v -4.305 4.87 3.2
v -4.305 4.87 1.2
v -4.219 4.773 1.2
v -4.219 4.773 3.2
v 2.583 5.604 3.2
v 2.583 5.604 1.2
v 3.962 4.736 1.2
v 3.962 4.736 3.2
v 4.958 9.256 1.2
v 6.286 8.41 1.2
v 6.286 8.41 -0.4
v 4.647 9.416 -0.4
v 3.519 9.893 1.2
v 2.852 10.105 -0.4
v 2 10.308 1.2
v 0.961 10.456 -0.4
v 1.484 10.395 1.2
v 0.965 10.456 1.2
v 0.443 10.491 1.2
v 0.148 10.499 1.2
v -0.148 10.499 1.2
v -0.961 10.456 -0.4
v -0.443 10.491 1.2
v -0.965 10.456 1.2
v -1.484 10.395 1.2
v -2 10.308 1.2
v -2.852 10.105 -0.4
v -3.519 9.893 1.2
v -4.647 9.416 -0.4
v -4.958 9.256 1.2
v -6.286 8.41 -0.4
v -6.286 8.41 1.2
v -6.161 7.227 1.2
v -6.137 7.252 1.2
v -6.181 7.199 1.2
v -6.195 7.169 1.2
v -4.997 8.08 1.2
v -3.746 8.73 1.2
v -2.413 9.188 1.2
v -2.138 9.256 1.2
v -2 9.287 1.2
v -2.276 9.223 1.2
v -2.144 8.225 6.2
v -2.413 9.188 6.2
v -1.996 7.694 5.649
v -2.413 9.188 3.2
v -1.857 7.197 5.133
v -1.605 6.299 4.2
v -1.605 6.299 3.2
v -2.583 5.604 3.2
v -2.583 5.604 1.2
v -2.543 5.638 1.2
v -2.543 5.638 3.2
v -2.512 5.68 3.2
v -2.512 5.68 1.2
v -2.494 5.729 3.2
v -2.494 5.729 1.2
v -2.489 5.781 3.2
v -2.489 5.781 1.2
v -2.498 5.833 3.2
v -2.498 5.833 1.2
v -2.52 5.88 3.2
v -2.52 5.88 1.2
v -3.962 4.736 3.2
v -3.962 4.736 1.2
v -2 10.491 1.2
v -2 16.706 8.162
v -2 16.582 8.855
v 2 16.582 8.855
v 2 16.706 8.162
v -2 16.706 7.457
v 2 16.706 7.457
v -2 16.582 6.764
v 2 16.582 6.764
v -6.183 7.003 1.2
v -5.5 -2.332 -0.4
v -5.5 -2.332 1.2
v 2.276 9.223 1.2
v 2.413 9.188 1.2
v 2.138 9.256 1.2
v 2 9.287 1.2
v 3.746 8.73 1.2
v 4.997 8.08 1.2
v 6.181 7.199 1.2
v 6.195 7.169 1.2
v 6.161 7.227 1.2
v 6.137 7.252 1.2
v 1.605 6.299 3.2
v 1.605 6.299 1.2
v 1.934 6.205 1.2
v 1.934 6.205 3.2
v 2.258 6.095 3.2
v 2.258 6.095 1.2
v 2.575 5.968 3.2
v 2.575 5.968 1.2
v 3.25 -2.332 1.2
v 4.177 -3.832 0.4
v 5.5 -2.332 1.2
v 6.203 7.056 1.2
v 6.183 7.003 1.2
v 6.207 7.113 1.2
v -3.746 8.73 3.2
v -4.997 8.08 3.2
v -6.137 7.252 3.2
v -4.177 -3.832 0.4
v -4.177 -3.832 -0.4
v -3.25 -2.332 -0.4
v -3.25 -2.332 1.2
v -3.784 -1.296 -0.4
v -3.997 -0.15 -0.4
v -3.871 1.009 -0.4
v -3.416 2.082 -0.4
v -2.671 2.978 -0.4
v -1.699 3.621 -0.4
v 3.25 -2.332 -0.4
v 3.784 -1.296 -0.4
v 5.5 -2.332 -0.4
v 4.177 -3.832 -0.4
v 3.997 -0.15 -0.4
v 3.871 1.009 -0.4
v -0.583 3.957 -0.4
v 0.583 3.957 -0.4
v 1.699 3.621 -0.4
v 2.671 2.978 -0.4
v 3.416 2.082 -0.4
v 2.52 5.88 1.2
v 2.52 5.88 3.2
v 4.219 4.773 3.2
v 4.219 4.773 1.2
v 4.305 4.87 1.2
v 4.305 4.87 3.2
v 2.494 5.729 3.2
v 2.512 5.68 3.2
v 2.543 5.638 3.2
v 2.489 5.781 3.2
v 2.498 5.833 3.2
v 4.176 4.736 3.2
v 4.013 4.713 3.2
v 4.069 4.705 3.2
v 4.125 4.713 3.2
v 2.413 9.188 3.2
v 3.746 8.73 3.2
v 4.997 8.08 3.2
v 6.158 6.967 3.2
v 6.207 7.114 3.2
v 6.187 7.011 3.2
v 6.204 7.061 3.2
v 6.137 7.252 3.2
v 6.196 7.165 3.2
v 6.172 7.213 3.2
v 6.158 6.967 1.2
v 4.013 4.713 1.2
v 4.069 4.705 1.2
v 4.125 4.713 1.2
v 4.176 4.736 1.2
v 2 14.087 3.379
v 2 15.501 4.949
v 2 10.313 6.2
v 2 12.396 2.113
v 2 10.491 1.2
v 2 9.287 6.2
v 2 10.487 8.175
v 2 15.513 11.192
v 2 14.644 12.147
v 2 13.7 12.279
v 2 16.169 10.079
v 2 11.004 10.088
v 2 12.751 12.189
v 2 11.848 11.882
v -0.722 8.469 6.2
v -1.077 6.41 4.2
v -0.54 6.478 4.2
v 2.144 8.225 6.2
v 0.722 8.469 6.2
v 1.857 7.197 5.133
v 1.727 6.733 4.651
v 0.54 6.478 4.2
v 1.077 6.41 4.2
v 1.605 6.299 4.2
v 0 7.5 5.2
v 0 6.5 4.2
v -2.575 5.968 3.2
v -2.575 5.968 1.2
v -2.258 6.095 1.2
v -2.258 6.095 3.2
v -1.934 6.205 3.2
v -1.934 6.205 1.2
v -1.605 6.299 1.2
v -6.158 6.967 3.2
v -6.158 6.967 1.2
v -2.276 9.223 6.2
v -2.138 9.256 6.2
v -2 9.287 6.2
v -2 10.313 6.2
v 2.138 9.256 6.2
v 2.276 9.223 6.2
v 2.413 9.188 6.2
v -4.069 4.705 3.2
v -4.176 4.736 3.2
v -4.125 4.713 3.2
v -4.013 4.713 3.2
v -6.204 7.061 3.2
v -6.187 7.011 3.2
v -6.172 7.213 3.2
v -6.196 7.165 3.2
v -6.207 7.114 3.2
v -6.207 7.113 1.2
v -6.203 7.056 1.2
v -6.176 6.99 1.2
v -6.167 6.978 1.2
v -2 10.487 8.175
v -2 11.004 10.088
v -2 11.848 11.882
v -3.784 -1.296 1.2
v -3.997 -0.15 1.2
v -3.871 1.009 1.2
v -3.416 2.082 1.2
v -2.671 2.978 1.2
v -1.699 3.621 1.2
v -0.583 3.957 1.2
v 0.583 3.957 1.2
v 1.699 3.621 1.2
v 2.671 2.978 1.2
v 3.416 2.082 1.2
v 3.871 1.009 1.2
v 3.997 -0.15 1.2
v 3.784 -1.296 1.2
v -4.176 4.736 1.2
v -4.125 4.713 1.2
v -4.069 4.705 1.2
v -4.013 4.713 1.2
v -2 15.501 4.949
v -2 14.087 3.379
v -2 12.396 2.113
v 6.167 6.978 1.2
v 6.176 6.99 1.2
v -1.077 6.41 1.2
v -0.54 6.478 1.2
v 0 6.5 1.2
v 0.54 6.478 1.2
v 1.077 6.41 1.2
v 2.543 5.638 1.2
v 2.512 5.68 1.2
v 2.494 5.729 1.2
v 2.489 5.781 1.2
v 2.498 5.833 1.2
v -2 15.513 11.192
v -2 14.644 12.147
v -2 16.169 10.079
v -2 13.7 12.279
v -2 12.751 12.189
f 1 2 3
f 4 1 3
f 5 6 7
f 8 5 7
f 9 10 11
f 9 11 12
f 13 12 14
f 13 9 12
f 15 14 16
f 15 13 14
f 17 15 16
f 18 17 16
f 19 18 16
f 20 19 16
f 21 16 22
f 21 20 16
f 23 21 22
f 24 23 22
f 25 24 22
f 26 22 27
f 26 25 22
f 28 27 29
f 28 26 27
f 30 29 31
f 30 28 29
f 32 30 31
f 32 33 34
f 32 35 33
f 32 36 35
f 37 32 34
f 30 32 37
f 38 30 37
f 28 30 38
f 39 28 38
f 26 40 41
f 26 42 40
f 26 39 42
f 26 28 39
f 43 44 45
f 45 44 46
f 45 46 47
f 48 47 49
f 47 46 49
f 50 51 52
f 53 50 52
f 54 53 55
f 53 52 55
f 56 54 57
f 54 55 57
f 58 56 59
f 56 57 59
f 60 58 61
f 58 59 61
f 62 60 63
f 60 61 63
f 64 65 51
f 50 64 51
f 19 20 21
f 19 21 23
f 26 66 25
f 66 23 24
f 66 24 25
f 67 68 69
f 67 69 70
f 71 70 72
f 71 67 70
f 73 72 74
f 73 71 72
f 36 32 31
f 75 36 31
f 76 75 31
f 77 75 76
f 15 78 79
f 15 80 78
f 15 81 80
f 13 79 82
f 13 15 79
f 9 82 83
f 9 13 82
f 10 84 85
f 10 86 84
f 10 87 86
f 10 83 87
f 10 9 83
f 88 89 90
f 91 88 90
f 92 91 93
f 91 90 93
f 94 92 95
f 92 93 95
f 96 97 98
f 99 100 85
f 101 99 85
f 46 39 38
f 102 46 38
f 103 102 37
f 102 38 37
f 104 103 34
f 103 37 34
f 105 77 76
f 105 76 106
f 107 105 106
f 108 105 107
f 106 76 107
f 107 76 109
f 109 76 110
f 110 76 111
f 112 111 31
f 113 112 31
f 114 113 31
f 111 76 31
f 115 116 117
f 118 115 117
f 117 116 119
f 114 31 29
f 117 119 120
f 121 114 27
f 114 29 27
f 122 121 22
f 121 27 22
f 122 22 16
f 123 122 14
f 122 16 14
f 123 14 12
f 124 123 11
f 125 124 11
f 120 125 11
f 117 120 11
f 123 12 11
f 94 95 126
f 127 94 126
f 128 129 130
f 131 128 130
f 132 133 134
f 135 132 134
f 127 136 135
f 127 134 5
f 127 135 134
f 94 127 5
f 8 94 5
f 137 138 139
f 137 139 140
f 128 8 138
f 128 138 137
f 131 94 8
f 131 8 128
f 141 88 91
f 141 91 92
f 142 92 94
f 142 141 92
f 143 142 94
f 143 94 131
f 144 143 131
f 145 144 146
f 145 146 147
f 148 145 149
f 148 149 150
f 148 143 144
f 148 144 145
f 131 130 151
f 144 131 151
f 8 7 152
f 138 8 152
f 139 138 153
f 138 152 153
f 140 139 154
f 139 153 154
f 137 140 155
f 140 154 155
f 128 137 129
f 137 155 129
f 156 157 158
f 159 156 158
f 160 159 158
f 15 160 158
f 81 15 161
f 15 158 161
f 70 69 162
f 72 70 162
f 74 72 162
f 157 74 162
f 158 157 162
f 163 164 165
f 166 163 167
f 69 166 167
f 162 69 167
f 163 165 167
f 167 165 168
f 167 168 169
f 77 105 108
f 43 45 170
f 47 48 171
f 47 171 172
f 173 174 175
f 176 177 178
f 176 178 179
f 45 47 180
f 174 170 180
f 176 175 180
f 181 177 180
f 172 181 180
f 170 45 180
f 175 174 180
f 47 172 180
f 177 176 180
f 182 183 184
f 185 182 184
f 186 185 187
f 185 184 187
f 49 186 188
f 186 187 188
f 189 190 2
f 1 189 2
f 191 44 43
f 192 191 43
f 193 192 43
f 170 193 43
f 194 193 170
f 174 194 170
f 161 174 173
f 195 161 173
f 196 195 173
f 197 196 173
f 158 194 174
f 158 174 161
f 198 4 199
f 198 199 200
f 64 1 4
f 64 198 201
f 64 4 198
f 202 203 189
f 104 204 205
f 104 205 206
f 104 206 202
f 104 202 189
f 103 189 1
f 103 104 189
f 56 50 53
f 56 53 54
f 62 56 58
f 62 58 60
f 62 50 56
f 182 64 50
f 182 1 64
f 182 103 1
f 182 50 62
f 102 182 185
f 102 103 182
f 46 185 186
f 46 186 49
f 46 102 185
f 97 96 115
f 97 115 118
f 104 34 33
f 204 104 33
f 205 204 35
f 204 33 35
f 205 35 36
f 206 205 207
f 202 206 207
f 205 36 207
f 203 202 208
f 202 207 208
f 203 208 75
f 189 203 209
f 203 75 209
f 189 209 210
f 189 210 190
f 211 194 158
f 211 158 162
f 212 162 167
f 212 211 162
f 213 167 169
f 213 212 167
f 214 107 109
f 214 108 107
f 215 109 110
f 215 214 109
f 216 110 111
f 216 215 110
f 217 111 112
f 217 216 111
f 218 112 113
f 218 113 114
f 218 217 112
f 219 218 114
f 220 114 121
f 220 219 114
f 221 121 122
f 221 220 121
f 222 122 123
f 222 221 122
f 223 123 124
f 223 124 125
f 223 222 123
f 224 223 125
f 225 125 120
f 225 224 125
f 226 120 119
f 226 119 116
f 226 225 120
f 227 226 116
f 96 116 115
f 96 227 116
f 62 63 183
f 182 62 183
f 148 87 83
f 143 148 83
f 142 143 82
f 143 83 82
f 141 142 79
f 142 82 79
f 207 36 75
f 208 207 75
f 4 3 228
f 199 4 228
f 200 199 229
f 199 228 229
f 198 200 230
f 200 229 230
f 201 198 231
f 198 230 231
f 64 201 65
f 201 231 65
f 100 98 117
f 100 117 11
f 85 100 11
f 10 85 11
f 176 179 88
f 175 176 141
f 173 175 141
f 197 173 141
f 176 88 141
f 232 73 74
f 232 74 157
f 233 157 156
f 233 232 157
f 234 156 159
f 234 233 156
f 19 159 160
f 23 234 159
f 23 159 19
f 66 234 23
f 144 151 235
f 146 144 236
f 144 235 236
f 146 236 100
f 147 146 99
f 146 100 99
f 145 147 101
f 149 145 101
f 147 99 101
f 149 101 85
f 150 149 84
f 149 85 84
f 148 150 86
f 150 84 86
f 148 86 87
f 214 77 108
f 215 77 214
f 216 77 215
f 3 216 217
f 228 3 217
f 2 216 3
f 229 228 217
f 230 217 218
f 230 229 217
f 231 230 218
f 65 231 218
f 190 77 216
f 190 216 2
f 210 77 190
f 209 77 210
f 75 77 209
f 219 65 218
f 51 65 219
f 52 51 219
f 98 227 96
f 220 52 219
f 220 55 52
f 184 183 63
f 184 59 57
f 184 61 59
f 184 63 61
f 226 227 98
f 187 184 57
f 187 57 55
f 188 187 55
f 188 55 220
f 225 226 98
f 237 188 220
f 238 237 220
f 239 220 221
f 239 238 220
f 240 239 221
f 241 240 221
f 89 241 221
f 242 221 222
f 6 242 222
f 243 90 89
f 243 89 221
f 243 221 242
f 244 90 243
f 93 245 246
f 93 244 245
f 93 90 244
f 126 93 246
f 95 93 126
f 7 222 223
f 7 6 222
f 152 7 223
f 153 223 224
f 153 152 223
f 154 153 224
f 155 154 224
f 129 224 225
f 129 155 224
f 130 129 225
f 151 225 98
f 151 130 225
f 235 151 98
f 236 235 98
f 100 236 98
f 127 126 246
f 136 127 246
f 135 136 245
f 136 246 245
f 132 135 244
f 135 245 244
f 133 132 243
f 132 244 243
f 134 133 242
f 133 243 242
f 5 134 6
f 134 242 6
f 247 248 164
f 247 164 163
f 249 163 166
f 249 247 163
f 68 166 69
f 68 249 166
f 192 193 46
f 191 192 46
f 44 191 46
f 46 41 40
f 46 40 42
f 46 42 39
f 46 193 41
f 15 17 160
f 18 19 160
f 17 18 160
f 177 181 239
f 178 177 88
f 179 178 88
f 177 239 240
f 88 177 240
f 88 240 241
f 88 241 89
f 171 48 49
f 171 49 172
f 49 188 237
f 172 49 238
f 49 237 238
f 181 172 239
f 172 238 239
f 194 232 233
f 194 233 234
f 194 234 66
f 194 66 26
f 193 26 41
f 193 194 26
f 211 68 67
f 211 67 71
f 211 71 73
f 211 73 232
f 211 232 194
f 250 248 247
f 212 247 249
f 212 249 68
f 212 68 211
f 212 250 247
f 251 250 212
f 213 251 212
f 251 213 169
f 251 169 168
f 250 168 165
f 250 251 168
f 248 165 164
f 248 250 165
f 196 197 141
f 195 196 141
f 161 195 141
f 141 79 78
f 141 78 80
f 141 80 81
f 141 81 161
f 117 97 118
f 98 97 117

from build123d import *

# Parameters (mm, degrees)
F1_DEPTH      = 1.2
F1_DEPTH_BACK = 0.4
F3_DEPTH      = 12.5
F5_DEPTH      = 2
F6_DEPTH      = 5
F7_T2_ANGLE   = 119.2786087223
F8_DEPTH      = 5
F10_DEPTH     = 4
F11_DEPTH     = 5


# Not quite as in the source:
# - a fillet or chamfer that OpenCascade refuses, or shapes differently, is made with other operations: its cross-section is extruded or revolved along the edge and cut away or added
# - a feature names something its author has since deleted; it is built from what else it names


with BuildPart() as f1:
    # F0 (on Top) → F1 (new body, two sides)
    with BuildSketch(Plane.XY) as f1_sk:
        with BuildLine():
            ThreePointArc((-3.25, -2.3318447633), (0, 4), (3.25, -2.3318447633))
            Line((3.25, -2.3318447633), (4.1771243445, -3.8318447633))
            Line((4.1771243445, -3.8318447633), (5.5, -2.3318447633))
            Line((5.5, -2.3318447633), (6.2861850371, 8.4103434936))
            ThreePointArc((6.2861850371, 8.4103434936), (0, 10.5), (-6.2861850371, 8.4103434936))
            Line((-6.2861850371, 8.4103434936), (-5.5, -2.3318447633))
            Line((-5.5, -2.3318447633), (-4.1771243445, -3.8318447633))
            Line((-4.1771243445, -3.8318447633), (-3.25, -2.3318447633))
        make_face()
    extrude(amount=F1_DEPTH)
    extrude(f1_sk.sketch, amount=-F1_DEPTH_BACK)

    # F2 (on Right) → F3 (cut, symmetric)
    with BuildSketch(Plane.YZ):
        Polygon((-3.8318447633, 0.4), (-2.3318447633, 1.2), (-3.8318447633, 1.2), align=None)
    extrude(amount=F3_DEPTH, both=True, mode=Mode.SUBTRACT)

    # F4 (on face) → F5 (join)
    with BuildSketch(Plane.XY.offset(1.2)):
        with BuildLine():
            Line((0, 9.4893432962), (0, 9.5))
            ThreePointArc((0, 9.5), (-1.0056504861, 9.4466219941), (-2, 9.2870878105))
            ThreePointArc((-2, 9.2870878105), (-2.207287093, 9.2400153511), (-2.4134691055, 9.1883168686))
            Line((-2.4134691055, 9.1883168686), (-1.6054997382, 6.2986006851))
            ThreePointArc((-1.6054997382, 6.2986006851), (-0.809041268, 6.4494536378), (0, 6.5))
            Line((0, 6.5), (0, 9.4893432962))
        make_face()
        with BuildLine():
            Line((0, 10.3126084432), (0, 9.5))
            ThreePointArc((0, 9.5), (1.0056504861, 9.4466219941), (2, 9.2870878105))
            Line((2, 9.2870878105), (2, 10.3126084432))
            Line((2, 10.3126084432), (0, 10.3126084432))
        make_face()
        with BuildLine():
            ThreePointArc((2, 9.2870878105), (1.0056504861, 9.4466219941), (0, 9.5))
            Line((0, 9.5), (0, 9.4893432962))
            Line((0, 9.4893432962), (0, 6.5))
            ThreePointArc((0, 6.5), (0.809041268, 6.4494536378), (1.6054997382, 6.2986006851))
            Line((1.6054997382, 6.2986006851), (2.4134691055, 9.1883168686))
            ThreePointArc((2.4134691055, 9.1883168686), (2.207287093, 9.2400153511), (2, 9.2870878105))
        make_face()
        with BuildLine():
            ThreePointArc((-2, 9.2870878105), (-1.0056504861, 9.4466219941), (0, 9.5))
            Line((0, 9.5), (0, 10.3126084432))
            Line((0, 10.3126084432), (-2, 10.3126084432))
            Line((-2, 10.3126084432), (-2, 9.2870878105))
        make_face()
        with BuildLine():
            Line((-1.6054997382, 6.2986006851), (-2.4134691055, 9.1883168686))
            ThreePointArc((-2.4134691055, 9.1883168686), (-4.3834961594, 8.4282240965), (-6.1369591907, 7.2517399217))
            ThreePointArc((-6.1369591907, 7.2517399217), (-6.2072372931, 7.1135226449), (-6.1576144754, 6.9666192642))
            Line((-6.1576144754, 6.9666192642), (-4.3047045796, 4.8702688306))
            Line((-4.3047045796, 4.8702688306), (-4.2185888433, 4.7728389657))
            ThreePointArc((-4.2185888433, 4.7728389657), (-4.0971505607, 4.7073203992), (-3.9621862374, 4.7360357341))
            Line((-3.9621862374, 4.7360357341), (-2.5827247856, 5.6044208159))
            ThreePointArc((-2.5827247856, 5.6044208159), (-2.4942501859, 5.7293355978), (-2.5200172859, 5.8802246764))
            Line((-2.5200172859, 5.8802246764), (-2.5753119947, 5.968062343))
            ThreePointArc((-2.5753119947, 5.968062343), (-2.096928846, 6.152470188), (-1.6054997382, 6.2986006851))
        make_face()
        with BuildLine():
            ThreePointArc((6.1369591907, 7.2517399217), (4.3834961594, 8.4282240965), (2.4134691055, 9.1883168686))
            Line((2.4134691055, 9.1883168686), (1.6054997382, 6.2986006851))
            ThreePointArc((1.6054997382, 6.2986006851), (2.096928846, 6.152470188), (2.5753119947, 5.968062343))
            Line((2.5753119947, 5.968062343), (2.5200172859, 5.8802246764))
            ThreePointArc((2.5200172859, 5.8802246764), (2.4942501859, 5.7293355978), (2.5827247856, 5.6044208159))
            Line((2.5827247856, 5.6044208159), (3.9621862374, 4.7360357341))
            ThreePointArc((3.9621862374, 4.7360357341), (4.0971505607, 4.7073203992), (4.2185888433, 4.7728389657))
            Line((4.2185888433, 4.7728389657), (4.3047045796, 4.8702688306))
            Line((4.3047045796, 4.8702688306), (6.1576144754, 6.9666192642))
            ThreePointArc((6.1576144754, 6.9666192642), (6.2072372931, 7.1135226449), (6.1369591907, 7.2517399217))
        make_face()
    extrude(amount=F5_DEPTH)

    # F4 (on face) → F6 (join)
    with BuildSketch(Plane.XY.offset(1.2)):
        with BuildLine():
            ThreePointArc((2, 9.2870878105), (1.0056504861, 9.4466219941), (0, 9.5))
            Line((0, 9.5), (0, 9.4893432962))
            Line((0, 9.4893432962), (0, 6.5))
            ThreePointArc((0, 6.5), (0.809041268, 6.4494536378), (1.6054997382, 6.2986006851))
            Line((1.6054997382, 6.2986006851), (2.4134691055, 9.1883168686))
            ThreePointArc((2.4134691055, 9.1883168686), (2.207287093, 9.2400153511), (2, 9.2870878105))
        make_face()
        with BuildLine():
            Line((0, 9.4893432962), (0, 9.5))
            ThreePointArc((0, 9.5), (-1.0056504861, 9.4466219941), (-2, 9.2870878105))
            ThreePointArc((-2, 9.2870878105), (-2.207287093, 9.2400153511), (-2.4134691055, 9.1883168686))
            Line((-2.4134691055, 9.1883168686), (-1.6054997382, 6.2986006851))
            ThreePointArc((-1.6054997382, 6.2986006851), (-0.809041268, 6.4494536378), (0, 6.5))
            Line((0, 6.5), (0, 9.4893432962))
        make_face()
    extrude(amount=F6_DEPTH)

    # F7: chamfer of 2 on 1 edges, made by hand

    # F7_s1 → F7_t2 (revolve, cut)
    with BuildSketch(Plane(origin=(0, 0, 0), x_dir=(0, 0, 1), z_dir=(-0.5054419689, -0.8628606006, 0))):
        Polygon((6.2, 8.5), (4.2, 6.5), (6.2, 6.5), align=None)
    revolve(axis=Axis((0, 0, 6.2), (0, 0, -1)), revolution_arc=F7_T2_ANGLE, mode=Mode.SUBTRACT)

    # F4 (on face) → F8 (join, through all)
    with BuildSketch(Plane.XY.offset(1.2)):
        with BuildLine():
            Line((0, 10.3126084432), (0, 9.5))
            ThreePointArc((0, 9.5), (1.0056504861, 9.4466219941), (2, 9.2870878105))
            Line((2, 9.2870878105), (2, 10.307764064))
            ThreePointArc((2, 10.307764064), (1.9874359165, 10.3101939108), (1.974868881, 10.3126084432))
            Line((1.974868881, 10.3126084432), (0, 10.3126084432))
        make_face()
        with BuildLine():
            ThreePointArc((1.974868881, 10.3126084432), (1.9874359165, 10.3101939108), (2, 10.307764064))
            Line((2, 10.307764064), (2, 10.3126084432))
            Line((2, 10.3126084432), (1.974868881, 10.3126084432))
        make_face()
        with BuildLine():
            Line((-2, 10.3126084432), (-2, 10.307764064))
            ThreePointArc((-2, 10.307764064), (-1.9874359165, 10.3101939108), (-1.974868881, 10.3126084432))
            Line((-1.974868881, 10.3126084432), (-2, 10.3126084432))
        make_face()
        with BuildLine():
            ThreePointArc((-2, 9.2870878105), (-1.0056504861, 9.4466219941), (0, 9.5))
            Line((0, 9.5), (0, 10.3126084432))
            Line((0, 10.3126084432), (-1.974868881, 10.3126084432))
            ThreePointArc((-1.974868881, 10.3126084432), (-1.9874359165, 10.3101939108), (-2, 10.307764064))
            Line((-2, 10.307764064), (-2, 9.2870878105))
        make_face()
    extrude(amount=F8_DEPTH)

    # F9 (on face) → F10 (join)
    with BuildSketch(Plane(origin=(-2, 0, 0), x_dir=(0, -1, 0), z_dir=(-1, 0, 0))):
        with BuildLine():
            Line((-10.4906475171, 1.2), (-10.3126084432, 1.2))
            Line((-10.3126084432, 1.2), (-10.3126084432, 6.2))
            ThreePointArc((-10.3126084432, 6.2), (-10.7033019047, 9.142871965), (-11.848315427, 11.8818646297))
            ThreePointArc((-11.848315427, 11.8818646297), (-13.2228522743, 12.2616673302), (-14.6442650052, 12.1468305588))
            ThreePointArc((-14.6442650052, 12.1468305588), (-15.8696799602, 10.6519801079), (-16.5821556002, 8.8551500812))
            ThreePointArc((-16.5821556002, 8.8551500812), (-16.7217466821, 7.8095628414), (-16.5821556002, 6.7639756016))
            ThreePointArc((-16.5821556002, 6.7639756016), (-14.0870903715, 3.3790869985), (-10.4906475171, 1.2))
        make_face()
    extrude(amount=-F10_DEPTH)

    # F4 (on face) → F11 (join, through all)
    with BuildSketch(Plane.XY.offset(1.2)):
        with BuildLine():
            Line((0, 10.3126084432), (0, 9.5))
            ThreePointArc((0, 9.5), (1.0056504861, 9.4466219941), (2, 9.2870878105))
            Line((2, 9.2870878105), (2, 10.307764064))
            ThreePointArc((2, 10.307764064), (1.9874359165, 10.3101939108), (1.974868881, 10.3126084432))
            Line((1.974868881, 10.3126084432), (0, 10.3126084432))
        make_face()
        with BuildLine():
            ThreePointArc((-2, 9.2870878105), (-1.0056504861, 9.4466219941), (0, 9.5))
            Line((0, 9.5), (0, 10.3126084432))
            Line((0, 10.3126084432), (-1.974868881, 10.3126084432))
            ThreePointArc((-1.974868881, 10.3126084432), (-1.9874359165, 10.3101939108), (-2, 10.307764064))
            Line((-2, 10.307764064), (-2, 9.2870878105))
        make_face()
    extrude(amount=F11_DEPTH)


solid = f1.part
